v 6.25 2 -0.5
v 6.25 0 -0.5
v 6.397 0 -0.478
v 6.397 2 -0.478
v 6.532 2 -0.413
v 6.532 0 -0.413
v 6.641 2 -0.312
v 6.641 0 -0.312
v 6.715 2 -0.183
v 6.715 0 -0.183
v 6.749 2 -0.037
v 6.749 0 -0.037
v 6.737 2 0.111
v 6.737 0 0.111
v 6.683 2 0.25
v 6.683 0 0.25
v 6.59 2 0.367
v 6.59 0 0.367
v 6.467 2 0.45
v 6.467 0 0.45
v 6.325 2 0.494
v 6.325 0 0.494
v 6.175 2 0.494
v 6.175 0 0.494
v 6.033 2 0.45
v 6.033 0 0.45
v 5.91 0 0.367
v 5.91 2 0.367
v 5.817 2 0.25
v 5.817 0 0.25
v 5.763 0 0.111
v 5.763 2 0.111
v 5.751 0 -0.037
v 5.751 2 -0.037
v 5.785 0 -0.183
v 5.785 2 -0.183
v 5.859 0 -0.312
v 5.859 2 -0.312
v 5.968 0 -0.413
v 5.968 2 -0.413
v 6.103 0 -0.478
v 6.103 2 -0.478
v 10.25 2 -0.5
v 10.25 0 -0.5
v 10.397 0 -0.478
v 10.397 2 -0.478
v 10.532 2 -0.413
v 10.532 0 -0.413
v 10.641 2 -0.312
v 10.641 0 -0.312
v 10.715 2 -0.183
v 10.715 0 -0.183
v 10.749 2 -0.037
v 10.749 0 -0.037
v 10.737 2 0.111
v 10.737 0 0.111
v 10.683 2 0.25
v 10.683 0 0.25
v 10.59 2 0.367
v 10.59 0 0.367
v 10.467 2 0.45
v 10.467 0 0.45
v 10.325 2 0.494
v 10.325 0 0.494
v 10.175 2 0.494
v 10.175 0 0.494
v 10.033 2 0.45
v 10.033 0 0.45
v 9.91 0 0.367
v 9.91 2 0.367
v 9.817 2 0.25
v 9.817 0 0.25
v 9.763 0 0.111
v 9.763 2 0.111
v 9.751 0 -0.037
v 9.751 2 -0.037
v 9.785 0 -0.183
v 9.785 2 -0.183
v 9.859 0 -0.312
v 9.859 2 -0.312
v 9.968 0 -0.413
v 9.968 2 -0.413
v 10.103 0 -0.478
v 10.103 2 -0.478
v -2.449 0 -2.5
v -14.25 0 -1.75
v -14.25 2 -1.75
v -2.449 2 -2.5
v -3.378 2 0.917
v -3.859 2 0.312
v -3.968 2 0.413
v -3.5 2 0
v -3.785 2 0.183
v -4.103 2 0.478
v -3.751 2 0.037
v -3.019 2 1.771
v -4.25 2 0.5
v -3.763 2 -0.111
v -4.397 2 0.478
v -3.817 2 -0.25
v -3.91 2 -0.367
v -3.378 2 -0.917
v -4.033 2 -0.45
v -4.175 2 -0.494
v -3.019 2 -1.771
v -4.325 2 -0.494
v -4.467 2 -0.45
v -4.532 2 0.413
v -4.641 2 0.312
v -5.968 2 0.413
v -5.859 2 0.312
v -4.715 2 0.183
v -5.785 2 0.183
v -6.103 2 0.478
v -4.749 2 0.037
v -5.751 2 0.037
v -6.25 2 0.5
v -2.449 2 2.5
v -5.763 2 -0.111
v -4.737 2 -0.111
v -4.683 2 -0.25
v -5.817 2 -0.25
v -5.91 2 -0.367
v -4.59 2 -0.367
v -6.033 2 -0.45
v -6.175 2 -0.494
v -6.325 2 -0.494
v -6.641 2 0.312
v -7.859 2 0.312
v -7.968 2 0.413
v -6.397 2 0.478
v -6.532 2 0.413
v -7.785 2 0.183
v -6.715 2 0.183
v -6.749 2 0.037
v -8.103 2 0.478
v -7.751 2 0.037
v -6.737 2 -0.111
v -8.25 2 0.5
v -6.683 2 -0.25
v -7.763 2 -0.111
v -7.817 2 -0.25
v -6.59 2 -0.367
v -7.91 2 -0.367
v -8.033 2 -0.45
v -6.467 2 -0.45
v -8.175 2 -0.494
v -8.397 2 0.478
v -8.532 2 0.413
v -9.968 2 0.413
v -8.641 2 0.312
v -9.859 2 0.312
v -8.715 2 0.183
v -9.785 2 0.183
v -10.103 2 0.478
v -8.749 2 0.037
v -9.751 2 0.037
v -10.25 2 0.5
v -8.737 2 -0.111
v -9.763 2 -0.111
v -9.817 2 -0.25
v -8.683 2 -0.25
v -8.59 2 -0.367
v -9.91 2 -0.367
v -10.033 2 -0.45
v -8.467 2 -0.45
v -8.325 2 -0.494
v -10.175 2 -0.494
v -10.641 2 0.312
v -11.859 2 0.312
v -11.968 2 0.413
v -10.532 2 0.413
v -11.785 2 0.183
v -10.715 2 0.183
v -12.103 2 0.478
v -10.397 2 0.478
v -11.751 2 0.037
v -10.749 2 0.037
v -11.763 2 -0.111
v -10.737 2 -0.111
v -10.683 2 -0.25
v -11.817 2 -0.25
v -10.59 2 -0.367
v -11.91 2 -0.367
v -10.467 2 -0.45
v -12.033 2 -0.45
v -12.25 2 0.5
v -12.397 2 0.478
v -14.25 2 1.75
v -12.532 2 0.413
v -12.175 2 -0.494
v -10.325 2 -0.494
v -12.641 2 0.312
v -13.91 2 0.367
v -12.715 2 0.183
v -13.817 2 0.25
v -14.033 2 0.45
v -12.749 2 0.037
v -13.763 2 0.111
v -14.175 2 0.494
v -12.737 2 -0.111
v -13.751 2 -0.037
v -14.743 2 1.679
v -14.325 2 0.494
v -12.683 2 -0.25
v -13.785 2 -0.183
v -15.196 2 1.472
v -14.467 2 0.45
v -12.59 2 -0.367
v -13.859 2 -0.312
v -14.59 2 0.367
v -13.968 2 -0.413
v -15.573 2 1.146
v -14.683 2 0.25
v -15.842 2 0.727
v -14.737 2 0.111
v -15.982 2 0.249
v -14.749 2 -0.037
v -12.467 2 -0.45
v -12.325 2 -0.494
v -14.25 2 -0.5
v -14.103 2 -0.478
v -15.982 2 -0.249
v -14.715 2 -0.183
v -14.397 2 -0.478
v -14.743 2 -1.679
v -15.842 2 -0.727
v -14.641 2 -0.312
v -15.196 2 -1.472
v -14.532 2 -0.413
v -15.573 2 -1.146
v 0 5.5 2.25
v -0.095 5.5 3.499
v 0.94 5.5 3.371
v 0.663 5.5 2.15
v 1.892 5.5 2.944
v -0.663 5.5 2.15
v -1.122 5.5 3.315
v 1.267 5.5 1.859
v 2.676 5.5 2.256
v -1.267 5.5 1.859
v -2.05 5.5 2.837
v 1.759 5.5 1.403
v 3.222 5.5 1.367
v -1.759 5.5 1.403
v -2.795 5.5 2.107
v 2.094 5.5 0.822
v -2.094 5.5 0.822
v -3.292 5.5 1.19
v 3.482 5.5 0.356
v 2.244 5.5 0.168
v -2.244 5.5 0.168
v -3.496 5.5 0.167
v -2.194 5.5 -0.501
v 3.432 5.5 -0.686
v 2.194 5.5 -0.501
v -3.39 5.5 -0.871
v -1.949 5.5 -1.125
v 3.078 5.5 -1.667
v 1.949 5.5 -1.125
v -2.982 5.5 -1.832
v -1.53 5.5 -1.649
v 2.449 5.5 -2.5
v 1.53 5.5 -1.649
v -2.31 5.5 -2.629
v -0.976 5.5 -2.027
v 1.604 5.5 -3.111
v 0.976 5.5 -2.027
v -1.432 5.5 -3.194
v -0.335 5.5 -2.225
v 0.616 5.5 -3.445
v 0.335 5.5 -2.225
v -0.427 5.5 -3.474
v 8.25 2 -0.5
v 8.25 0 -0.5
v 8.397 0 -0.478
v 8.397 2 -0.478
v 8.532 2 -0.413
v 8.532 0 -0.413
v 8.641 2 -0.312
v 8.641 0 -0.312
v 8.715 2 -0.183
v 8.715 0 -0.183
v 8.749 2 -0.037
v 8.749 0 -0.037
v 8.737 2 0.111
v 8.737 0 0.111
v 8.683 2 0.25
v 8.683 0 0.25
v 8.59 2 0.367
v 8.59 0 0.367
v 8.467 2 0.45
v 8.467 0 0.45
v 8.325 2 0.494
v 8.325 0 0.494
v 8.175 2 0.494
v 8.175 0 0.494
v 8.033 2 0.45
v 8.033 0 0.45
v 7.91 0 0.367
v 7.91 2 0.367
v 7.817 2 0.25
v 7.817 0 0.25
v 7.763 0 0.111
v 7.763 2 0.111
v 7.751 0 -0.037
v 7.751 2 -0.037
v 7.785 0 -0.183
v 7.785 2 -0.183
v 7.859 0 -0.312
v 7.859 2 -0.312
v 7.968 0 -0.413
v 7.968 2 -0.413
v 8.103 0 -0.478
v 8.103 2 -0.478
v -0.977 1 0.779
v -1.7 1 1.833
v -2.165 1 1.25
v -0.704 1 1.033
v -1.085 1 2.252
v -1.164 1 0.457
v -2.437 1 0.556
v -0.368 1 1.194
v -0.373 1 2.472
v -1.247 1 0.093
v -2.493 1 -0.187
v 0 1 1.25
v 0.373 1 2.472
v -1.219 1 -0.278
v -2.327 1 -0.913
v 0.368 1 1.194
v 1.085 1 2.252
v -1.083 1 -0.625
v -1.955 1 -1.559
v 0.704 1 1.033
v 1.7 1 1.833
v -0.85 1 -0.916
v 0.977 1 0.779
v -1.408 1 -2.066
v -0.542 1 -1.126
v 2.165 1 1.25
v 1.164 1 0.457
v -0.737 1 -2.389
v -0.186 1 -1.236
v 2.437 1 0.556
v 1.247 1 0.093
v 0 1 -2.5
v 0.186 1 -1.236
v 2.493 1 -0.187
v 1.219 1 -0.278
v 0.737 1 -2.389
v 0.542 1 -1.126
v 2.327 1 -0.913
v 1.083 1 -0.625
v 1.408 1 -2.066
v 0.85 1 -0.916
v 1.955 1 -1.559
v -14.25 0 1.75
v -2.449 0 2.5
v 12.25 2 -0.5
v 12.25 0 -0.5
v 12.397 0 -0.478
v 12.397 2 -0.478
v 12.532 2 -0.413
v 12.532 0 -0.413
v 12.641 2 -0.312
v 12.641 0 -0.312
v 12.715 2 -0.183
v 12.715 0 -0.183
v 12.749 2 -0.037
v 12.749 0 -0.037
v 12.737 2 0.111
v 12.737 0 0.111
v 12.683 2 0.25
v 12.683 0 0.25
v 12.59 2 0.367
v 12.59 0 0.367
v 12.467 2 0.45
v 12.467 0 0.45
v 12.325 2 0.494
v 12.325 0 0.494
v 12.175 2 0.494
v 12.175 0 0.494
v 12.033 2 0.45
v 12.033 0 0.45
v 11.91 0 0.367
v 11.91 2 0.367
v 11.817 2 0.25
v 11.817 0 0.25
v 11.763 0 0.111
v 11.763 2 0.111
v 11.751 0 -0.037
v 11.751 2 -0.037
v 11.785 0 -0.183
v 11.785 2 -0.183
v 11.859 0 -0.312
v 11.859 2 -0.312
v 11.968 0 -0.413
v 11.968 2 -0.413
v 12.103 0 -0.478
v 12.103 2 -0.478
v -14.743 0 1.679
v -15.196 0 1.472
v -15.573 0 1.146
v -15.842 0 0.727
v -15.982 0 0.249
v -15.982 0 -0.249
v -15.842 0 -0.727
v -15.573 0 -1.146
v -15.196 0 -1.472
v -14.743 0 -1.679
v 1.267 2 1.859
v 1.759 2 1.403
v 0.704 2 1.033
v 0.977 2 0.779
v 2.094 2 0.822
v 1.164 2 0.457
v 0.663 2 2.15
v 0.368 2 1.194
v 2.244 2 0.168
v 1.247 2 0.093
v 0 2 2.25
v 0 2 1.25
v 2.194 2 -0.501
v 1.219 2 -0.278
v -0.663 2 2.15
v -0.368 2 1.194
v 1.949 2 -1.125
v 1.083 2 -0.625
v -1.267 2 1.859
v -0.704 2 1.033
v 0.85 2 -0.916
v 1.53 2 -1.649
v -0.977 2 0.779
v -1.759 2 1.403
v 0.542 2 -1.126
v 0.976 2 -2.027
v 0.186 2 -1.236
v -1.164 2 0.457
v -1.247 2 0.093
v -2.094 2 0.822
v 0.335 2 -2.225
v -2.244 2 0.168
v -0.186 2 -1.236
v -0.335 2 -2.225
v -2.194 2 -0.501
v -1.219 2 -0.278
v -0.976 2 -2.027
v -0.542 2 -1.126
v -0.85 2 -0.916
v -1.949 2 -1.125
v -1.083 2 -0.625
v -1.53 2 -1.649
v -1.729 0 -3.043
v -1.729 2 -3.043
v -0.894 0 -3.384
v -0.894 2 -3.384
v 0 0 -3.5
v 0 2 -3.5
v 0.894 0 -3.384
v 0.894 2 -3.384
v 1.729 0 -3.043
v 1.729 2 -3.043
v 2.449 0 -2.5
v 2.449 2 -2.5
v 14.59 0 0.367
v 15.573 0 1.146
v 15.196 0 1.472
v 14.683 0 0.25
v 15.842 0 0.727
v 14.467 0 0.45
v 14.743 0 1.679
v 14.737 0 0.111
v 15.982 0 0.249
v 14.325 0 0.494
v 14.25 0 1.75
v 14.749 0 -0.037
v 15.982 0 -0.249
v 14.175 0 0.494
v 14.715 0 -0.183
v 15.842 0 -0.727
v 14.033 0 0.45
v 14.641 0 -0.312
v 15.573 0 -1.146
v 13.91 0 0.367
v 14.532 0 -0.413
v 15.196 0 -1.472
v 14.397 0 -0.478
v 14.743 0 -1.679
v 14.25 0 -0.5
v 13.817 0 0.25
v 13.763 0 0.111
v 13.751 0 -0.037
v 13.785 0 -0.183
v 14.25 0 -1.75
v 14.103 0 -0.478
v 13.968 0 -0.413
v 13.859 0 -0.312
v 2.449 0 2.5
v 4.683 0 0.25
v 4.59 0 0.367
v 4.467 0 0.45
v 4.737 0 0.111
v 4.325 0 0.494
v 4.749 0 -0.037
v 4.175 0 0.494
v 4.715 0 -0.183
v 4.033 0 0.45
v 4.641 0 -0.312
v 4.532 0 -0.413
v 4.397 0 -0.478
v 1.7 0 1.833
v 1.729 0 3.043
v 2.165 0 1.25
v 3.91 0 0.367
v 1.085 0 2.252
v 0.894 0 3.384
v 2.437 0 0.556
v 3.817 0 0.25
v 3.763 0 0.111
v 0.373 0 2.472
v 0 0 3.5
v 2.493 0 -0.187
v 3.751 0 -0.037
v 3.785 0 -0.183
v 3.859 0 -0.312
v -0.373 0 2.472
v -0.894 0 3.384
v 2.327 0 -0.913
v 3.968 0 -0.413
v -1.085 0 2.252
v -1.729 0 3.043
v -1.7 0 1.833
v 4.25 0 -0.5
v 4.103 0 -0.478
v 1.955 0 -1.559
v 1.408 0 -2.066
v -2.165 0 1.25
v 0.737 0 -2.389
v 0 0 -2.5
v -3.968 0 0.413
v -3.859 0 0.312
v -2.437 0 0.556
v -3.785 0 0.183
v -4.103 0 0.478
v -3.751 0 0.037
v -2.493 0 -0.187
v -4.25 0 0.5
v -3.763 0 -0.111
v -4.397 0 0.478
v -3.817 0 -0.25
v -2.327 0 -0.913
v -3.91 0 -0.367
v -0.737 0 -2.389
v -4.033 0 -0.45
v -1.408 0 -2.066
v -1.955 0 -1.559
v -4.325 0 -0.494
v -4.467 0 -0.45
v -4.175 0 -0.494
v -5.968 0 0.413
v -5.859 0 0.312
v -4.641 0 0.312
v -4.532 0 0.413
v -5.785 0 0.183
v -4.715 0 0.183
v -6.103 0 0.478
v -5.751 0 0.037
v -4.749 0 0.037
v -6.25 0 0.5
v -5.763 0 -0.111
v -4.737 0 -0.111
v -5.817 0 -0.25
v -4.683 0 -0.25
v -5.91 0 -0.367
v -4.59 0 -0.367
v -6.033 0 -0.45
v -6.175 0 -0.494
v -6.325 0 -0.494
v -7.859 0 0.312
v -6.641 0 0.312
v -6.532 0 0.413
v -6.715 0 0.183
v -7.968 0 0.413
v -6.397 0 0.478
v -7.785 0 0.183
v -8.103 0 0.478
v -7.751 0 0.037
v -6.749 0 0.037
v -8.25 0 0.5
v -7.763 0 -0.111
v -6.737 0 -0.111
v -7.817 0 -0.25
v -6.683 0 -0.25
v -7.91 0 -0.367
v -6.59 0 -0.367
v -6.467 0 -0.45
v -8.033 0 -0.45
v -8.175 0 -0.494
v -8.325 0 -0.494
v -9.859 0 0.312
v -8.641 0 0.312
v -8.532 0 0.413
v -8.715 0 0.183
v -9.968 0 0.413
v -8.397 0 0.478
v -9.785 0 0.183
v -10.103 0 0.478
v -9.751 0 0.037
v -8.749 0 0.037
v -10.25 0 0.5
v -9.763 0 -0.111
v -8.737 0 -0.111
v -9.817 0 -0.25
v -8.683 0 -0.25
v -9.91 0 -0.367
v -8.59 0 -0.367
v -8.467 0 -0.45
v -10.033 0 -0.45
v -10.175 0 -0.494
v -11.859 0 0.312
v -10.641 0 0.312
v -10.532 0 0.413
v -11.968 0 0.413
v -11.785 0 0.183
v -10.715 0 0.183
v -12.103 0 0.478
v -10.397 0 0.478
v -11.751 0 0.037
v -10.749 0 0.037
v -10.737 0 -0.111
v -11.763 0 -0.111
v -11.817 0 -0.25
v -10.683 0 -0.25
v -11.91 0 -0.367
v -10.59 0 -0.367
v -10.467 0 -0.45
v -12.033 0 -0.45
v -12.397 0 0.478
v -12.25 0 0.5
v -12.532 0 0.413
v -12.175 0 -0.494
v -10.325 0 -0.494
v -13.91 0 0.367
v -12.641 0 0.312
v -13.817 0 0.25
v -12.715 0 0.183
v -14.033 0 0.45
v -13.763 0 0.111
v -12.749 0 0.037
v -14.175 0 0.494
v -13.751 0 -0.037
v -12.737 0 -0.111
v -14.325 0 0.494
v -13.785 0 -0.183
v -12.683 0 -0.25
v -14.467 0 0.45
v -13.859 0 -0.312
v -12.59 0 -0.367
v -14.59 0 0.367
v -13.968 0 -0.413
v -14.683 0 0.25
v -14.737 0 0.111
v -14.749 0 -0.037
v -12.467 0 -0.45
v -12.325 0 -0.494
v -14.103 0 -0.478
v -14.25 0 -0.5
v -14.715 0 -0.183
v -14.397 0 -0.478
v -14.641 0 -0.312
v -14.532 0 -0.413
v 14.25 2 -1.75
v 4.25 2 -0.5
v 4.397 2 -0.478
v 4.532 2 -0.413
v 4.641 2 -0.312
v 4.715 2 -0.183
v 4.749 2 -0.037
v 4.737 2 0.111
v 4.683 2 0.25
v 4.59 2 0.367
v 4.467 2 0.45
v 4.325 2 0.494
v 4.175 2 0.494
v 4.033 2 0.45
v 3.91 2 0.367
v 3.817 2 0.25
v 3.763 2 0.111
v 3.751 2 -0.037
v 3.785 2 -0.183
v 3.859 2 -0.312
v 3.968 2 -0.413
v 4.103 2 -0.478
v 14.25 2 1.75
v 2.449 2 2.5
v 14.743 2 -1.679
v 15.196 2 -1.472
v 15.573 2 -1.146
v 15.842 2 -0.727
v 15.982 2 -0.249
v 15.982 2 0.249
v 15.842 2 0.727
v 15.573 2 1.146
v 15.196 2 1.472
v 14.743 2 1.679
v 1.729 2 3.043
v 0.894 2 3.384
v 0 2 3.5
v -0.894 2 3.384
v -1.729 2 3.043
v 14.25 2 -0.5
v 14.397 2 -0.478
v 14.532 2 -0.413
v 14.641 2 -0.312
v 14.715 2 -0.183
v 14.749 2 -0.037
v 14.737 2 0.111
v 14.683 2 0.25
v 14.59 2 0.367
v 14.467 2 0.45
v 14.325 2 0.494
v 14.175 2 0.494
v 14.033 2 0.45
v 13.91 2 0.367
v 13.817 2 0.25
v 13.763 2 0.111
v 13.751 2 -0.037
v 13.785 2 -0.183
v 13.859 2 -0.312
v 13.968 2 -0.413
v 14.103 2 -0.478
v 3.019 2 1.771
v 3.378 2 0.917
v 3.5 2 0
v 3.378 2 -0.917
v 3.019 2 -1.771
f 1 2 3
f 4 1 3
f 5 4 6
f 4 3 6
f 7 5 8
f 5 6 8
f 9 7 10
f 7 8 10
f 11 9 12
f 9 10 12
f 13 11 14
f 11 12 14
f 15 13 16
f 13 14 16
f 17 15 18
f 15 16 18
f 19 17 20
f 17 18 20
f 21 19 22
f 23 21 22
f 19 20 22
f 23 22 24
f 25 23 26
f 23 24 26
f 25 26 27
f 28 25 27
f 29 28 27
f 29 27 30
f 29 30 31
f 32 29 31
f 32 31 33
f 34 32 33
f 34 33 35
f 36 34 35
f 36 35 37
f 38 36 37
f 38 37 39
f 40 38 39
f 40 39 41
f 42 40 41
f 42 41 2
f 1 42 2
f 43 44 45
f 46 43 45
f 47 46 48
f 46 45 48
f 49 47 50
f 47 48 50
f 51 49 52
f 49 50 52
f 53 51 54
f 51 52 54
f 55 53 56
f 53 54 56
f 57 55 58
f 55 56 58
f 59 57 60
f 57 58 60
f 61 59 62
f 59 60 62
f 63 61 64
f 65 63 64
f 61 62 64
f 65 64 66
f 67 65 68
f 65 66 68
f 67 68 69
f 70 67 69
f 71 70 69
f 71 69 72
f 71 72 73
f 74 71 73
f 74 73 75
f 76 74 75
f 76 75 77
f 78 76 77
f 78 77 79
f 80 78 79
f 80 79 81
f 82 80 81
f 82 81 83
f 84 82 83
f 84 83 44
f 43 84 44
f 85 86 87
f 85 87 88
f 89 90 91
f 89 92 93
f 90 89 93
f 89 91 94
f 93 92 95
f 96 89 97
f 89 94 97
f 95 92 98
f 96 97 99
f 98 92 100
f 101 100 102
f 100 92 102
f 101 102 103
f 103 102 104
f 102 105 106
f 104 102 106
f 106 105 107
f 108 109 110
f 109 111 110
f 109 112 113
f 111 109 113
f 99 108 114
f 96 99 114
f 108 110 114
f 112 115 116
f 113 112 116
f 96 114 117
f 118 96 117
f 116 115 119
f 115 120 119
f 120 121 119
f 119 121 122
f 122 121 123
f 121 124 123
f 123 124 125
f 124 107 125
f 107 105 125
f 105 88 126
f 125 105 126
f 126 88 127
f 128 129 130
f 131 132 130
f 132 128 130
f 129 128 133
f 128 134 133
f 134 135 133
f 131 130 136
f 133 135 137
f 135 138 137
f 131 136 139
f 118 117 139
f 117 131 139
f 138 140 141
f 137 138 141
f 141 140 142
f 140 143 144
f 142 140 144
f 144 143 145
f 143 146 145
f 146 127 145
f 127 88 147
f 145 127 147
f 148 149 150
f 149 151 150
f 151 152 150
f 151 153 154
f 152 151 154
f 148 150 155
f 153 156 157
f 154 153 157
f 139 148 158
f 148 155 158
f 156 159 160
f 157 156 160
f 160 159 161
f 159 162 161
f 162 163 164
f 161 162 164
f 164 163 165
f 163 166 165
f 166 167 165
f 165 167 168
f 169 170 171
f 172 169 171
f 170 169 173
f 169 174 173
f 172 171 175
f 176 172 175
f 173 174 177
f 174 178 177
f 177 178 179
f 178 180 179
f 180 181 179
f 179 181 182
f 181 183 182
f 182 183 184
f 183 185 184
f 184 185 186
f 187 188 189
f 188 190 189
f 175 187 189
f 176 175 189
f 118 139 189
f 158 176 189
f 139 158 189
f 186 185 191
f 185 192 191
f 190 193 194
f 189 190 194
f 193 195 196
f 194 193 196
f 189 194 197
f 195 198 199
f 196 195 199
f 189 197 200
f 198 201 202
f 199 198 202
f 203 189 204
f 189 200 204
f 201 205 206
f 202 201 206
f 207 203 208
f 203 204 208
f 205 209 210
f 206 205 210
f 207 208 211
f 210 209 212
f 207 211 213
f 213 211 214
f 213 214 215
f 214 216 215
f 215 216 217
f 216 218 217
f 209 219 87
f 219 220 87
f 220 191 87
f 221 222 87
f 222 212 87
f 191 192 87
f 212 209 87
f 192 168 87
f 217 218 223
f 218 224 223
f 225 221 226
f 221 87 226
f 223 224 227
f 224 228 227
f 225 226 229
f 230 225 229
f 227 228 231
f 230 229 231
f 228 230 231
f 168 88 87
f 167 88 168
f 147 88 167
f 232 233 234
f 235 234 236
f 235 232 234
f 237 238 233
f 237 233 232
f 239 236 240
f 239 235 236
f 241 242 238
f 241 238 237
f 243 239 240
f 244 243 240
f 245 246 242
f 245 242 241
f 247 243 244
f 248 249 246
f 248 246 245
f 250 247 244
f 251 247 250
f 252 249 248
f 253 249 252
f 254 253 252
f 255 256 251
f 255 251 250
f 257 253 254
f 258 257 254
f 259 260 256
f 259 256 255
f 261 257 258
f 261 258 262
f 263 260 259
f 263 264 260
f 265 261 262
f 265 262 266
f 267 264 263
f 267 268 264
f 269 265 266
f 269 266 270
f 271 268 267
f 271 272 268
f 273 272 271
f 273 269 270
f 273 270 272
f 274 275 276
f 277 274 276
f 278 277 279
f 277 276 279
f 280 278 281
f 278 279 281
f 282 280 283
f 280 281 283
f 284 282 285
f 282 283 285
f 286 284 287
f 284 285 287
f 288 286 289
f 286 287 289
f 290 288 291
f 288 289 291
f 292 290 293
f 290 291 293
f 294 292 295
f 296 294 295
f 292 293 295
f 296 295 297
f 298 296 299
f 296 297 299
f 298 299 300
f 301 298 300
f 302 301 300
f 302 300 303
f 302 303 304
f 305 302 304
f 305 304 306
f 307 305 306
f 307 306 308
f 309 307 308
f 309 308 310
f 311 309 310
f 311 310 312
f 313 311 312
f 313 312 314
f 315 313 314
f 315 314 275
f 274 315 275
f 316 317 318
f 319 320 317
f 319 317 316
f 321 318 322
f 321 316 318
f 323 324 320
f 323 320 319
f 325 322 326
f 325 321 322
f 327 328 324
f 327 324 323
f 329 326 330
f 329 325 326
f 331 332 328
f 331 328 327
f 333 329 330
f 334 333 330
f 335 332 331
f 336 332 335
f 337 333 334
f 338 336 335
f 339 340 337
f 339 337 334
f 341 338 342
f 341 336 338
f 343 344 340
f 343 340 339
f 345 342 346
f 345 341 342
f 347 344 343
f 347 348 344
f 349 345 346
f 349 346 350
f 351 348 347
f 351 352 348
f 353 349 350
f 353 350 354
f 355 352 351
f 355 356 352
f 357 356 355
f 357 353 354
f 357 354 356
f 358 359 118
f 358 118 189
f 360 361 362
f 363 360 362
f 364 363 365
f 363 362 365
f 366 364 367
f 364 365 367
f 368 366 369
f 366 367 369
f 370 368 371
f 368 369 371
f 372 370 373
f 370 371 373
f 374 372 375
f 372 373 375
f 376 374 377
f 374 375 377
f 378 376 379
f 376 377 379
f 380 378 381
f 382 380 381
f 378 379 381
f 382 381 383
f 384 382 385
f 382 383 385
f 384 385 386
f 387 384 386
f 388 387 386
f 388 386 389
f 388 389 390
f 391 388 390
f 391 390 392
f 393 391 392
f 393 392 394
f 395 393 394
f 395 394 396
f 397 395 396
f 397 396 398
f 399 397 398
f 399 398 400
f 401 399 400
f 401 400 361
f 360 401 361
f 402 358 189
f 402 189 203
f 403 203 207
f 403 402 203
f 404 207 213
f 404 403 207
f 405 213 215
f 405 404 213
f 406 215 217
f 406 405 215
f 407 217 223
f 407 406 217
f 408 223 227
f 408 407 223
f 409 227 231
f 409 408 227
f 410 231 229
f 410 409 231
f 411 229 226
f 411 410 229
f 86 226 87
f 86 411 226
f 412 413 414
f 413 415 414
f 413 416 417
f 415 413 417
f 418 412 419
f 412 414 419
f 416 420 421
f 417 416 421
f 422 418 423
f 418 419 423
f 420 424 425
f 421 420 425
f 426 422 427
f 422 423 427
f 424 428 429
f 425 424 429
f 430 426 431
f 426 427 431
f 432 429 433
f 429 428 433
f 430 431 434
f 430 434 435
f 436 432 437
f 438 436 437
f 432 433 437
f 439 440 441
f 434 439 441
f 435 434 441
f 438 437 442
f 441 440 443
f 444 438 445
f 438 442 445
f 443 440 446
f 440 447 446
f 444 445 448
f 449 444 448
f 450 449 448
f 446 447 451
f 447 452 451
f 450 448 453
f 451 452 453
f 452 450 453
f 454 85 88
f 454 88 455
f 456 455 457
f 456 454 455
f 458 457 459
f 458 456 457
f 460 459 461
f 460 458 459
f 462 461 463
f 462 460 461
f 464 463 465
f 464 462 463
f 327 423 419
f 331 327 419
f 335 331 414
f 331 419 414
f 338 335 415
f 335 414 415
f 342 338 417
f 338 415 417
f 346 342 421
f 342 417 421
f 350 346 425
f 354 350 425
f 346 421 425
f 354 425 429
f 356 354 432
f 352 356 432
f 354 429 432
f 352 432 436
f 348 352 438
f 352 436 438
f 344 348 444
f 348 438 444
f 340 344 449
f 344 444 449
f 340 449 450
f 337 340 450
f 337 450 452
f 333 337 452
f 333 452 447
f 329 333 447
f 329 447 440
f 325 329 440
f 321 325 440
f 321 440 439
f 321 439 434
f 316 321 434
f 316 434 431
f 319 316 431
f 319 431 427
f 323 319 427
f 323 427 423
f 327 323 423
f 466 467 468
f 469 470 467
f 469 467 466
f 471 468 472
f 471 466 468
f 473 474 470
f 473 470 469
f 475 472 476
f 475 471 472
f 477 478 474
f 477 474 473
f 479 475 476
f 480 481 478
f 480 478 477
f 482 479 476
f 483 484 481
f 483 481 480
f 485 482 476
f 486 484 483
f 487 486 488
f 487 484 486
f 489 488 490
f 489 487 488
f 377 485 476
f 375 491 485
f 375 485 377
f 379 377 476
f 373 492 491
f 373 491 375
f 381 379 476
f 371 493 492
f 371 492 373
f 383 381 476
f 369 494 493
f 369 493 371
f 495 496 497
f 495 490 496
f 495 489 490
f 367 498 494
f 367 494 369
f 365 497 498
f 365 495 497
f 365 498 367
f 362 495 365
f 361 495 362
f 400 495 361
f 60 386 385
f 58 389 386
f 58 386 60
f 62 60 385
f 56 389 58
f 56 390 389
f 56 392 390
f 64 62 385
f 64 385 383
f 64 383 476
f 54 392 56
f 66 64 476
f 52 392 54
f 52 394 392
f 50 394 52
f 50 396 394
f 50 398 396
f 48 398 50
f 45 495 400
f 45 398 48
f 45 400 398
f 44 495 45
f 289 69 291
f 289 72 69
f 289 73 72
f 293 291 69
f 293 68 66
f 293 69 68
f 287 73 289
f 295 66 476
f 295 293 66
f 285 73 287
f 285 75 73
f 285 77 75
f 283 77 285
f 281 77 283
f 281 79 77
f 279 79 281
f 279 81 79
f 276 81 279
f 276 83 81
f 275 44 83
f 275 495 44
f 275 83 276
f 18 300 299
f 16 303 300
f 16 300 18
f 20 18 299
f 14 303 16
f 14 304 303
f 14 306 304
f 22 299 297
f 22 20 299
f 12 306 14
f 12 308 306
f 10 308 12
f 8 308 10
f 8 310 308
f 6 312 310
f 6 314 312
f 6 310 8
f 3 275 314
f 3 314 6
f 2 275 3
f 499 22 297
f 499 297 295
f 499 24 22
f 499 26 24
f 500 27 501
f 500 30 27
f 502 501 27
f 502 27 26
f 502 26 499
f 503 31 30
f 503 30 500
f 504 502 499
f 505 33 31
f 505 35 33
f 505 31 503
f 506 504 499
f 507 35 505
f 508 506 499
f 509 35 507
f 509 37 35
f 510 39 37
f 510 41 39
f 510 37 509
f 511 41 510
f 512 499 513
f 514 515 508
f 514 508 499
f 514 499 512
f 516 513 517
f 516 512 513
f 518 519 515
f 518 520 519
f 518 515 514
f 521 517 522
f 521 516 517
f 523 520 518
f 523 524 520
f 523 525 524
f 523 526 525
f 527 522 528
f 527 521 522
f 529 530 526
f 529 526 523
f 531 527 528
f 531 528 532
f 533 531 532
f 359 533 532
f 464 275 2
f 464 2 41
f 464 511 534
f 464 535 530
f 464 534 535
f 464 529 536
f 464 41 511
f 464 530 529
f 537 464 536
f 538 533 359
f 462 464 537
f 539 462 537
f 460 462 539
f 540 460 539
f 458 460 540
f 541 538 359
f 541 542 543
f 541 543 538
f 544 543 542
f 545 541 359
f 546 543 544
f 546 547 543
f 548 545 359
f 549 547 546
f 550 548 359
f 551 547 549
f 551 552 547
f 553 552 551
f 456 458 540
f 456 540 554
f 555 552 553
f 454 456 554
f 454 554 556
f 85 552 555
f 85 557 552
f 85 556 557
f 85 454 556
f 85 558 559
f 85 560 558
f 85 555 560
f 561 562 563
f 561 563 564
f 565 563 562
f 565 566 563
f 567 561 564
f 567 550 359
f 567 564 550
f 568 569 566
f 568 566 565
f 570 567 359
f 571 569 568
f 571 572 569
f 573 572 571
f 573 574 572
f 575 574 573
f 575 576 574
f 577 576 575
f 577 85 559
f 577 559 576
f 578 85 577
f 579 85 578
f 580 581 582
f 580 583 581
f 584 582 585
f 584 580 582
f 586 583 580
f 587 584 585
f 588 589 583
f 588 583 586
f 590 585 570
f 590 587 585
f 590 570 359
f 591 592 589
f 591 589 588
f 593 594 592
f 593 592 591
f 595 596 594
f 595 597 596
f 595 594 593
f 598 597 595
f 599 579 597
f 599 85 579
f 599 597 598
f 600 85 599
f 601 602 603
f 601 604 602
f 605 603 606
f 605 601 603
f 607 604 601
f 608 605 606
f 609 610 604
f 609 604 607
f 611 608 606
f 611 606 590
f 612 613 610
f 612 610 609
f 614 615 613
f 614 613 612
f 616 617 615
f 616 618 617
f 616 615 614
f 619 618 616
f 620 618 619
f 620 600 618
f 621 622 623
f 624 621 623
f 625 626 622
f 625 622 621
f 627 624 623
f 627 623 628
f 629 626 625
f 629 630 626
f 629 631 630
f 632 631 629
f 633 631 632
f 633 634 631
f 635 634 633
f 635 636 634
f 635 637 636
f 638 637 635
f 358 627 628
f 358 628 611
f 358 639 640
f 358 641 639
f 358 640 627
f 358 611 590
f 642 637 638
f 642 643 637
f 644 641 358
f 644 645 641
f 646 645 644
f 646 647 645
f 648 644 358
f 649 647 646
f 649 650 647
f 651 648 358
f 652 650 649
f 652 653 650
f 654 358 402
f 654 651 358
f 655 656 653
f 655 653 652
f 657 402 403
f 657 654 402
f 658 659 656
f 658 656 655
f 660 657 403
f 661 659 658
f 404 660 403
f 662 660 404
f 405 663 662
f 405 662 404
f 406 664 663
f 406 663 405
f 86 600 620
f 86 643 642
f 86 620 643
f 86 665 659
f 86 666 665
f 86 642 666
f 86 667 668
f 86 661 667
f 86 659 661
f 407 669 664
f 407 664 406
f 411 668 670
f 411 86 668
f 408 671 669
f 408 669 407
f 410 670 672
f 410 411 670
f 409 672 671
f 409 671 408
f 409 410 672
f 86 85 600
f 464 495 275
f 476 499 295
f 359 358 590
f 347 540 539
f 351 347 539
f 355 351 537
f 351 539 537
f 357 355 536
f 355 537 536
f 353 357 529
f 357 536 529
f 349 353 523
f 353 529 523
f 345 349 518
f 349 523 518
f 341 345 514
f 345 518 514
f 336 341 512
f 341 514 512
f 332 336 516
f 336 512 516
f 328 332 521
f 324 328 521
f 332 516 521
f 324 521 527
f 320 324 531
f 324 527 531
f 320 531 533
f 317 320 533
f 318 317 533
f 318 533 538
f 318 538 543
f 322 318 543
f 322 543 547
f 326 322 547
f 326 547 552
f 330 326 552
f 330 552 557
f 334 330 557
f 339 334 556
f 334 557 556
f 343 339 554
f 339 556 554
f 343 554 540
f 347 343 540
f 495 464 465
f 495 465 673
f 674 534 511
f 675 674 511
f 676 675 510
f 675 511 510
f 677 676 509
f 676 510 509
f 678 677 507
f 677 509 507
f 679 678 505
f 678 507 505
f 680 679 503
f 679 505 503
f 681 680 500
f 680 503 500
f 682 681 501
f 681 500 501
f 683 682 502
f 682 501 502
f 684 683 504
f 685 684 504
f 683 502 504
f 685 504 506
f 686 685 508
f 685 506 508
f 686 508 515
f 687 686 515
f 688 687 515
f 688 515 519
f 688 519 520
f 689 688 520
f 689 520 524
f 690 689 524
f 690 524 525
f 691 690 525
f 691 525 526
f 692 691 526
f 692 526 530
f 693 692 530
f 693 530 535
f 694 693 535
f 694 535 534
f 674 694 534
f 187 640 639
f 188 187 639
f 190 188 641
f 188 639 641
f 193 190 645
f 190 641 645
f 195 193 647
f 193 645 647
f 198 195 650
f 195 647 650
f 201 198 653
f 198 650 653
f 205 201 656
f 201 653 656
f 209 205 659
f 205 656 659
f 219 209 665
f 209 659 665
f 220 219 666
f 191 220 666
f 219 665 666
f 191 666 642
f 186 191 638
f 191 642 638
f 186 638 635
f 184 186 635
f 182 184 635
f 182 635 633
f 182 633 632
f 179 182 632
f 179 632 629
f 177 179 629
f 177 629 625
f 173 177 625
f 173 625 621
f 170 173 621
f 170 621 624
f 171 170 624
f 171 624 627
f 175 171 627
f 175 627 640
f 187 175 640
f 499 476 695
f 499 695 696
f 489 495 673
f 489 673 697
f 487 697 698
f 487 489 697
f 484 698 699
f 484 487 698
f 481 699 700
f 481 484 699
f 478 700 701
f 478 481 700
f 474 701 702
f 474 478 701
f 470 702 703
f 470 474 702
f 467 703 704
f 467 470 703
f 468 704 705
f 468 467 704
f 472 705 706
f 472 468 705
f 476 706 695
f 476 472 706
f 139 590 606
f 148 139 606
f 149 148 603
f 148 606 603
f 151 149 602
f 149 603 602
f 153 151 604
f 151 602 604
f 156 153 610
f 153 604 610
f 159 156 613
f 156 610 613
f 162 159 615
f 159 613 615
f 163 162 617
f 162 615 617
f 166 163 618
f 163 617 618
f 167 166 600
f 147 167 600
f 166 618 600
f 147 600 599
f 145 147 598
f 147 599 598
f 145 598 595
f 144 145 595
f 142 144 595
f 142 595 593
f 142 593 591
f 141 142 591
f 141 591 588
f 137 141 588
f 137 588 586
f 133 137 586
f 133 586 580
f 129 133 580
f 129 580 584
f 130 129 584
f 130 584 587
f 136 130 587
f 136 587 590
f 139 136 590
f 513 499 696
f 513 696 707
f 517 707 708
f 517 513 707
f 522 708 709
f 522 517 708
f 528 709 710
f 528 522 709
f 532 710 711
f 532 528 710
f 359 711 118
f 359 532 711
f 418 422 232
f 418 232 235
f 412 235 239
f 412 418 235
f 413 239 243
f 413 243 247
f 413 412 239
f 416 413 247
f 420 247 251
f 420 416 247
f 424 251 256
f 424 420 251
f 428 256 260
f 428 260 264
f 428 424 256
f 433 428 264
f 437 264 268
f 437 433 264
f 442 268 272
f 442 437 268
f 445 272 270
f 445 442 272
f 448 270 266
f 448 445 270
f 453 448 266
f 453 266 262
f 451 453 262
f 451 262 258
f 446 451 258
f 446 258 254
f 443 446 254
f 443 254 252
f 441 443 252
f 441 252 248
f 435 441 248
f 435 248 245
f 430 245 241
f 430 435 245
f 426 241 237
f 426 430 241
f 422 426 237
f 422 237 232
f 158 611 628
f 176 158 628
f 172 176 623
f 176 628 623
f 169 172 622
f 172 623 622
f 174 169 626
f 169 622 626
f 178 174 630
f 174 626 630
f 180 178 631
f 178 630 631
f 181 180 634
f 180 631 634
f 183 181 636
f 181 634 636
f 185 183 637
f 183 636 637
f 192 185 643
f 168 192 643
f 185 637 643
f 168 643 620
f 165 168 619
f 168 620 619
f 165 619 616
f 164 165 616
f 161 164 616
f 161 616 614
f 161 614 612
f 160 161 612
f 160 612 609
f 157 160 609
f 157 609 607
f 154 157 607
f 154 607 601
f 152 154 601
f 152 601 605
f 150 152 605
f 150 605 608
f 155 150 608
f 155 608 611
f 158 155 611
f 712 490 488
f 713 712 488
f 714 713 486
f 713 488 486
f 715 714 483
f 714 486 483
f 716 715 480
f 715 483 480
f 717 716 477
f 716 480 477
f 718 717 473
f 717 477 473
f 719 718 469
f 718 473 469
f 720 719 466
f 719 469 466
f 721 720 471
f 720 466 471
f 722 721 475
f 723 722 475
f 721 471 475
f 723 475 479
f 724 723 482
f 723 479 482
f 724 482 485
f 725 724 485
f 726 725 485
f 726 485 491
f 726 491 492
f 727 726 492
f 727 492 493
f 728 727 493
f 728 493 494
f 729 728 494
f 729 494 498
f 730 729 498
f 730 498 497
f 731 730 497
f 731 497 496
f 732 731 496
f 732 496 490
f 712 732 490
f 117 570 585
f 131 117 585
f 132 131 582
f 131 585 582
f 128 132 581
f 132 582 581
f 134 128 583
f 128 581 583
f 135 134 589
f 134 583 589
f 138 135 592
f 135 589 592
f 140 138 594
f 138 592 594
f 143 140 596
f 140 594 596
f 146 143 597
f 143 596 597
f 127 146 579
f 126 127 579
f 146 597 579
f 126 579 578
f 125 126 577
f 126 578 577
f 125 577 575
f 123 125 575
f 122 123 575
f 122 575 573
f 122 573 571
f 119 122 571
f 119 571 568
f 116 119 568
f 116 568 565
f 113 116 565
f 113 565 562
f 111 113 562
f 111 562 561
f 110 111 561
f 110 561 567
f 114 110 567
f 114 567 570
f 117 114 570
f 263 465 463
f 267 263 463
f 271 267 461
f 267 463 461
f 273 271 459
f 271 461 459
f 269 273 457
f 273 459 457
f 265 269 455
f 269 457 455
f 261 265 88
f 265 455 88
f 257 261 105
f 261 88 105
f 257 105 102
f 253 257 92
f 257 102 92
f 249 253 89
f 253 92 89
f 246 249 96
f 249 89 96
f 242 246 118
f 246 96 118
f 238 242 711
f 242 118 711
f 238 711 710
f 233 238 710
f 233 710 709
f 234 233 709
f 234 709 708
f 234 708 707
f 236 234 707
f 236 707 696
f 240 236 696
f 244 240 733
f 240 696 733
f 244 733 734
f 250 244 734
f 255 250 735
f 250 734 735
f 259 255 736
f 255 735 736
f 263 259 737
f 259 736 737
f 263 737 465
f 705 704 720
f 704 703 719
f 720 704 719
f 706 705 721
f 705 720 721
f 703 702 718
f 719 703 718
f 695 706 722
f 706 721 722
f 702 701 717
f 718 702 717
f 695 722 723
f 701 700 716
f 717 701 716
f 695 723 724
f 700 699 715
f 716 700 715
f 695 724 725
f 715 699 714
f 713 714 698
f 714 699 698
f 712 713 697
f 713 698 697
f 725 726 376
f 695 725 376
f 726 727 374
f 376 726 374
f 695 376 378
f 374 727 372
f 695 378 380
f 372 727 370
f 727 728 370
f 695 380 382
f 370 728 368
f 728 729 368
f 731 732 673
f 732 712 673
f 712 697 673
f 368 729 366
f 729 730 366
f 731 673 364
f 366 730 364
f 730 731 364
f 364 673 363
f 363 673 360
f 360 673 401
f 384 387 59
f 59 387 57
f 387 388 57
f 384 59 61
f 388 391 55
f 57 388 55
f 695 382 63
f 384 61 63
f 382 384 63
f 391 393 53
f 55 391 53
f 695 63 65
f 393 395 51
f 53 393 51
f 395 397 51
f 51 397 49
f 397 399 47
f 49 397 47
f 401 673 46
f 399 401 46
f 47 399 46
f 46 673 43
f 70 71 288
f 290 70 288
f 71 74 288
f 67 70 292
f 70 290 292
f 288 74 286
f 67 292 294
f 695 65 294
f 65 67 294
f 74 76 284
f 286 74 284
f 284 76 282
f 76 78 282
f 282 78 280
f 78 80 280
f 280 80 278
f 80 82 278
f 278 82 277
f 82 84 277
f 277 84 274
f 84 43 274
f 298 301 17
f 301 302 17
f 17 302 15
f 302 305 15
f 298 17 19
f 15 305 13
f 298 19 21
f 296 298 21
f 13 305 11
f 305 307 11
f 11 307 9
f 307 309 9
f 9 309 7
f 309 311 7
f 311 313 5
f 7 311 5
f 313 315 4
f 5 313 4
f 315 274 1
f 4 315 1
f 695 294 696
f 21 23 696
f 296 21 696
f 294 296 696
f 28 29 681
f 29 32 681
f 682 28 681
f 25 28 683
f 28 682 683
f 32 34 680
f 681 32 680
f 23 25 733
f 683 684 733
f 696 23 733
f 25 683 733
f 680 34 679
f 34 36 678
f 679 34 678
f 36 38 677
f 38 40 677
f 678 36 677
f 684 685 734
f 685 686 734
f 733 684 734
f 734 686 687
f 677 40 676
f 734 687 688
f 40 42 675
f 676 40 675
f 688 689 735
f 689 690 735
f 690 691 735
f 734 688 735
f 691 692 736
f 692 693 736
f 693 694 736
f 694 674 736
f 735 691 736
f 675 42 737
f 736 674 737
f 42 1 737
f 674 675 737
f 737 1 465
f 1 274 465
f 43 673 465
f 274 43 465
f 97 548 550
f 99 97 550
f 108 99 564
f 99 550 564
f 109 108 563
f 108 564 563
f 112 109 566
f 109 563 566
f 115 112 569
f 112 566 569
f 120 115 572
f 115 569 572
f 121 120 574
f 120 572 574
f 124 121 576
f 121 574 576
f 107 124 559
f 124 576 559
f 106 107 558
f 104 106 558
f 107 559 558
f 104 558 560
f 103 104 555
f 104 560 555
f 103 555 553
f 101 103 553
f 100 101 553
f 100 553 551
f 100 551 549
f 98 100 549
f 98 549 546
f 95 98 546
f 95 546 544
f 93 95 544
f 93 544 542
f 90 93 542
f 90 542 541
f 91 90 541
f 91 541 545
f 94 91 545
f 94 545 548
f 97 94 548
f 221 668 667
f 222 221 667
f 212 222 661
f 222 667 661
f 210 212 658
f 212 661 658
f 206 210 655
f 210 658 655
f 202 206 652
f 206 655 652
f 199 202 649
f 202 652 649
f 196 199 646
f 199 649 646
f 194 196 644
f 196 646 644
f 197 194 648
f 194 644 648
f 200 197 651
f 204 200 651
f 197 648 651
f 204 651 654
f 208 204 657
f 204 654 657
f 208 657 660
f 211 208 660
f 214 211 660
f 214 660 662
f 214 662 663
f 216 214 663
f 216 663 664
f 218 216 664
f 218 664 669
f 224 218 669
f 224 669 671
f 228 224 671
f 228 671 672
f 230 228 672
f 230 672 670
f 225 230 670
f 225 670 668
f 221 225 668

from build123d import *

# Parameters (mm, degrees)
BOSS_EXTRUDE1_DEPTH = 2
SKETCH2_R           = 3.5
SKETCH2_R_2         = 2.25
BOSS_EXTRUDE2_DEPTH = 3.5
SKETCH3_R           = 1.25
CUT_EXTRUDE1_DEPTH  = 5
SKETCH4_R           = 2.5
CUT_EXTRUDE2_DEPTH  = 1
SKETCH5_R           = 0.5
CUT_EXTRUDE3_DEPTH  = 5


with BuildPart() as part:
    # Sketch1 → Boss-Extrude1 (new body)
    with BuildSketch(Plane(origin=(0, 0, 0), x_dir=(1, 0, 0), z_dir=(0, 1, 0))):
        with BuildLine():
            Line((-14.25, 1.75), (-2.449489743, 2.5))
            ThreePointArc((-2.449489743, 2.5), (0, 3.5), (2.449489743, 2.5))
            Line((2.449489743, 2.5), (14.25, 1.75))
            ThreePointArc((14.25, 1.75), (16, 0), (14.25, -1.75))
            Line((14.25, -1.75), (2.449489743, -2.5))
            ThreePointArc((2.449489743, -2.5), (0, -3.5), (-2.449489743, -2.5))
            Line((-2.449489743, -2.5), (-14.25, -1.75))
            ThreePointArc((-14.25, -1.75), (-16, 0), (-14.25, 1.75))
        make_face()
    extrude(amount=BOSS_EXTRUDE1_DEPTH)

    # Sketch2 → Boss-Extrude2 (add)
    with BuildSketch(Plane(origin=(0, 2, 0), x_dir=(1, 0, 0), z_dir=(0, 1, 0))):
        Circle(SKETCH2_R)
        Circle(SKETCH2_R_2, mode=Mode.SUBTRACT)
    extrude(amount=BOSS_EXTRUDE2_DEPTH)

    # Sketch3 → Cut-Extrude1 (cut)
    with BuildSketch(Plane(origin=(0, 2, 0), x_dir=(1, 0, 0), z_dir=(0, 1, 0))):
        Circle(SKETCH3_R)
    extrude(amount=-CUT_EXTRUDE1_DEPTH, mode=Mode.SUBTRACT)

    # Sketch4 → Cut-Extrude2 (cut)
    with BuildSketch(Plane.XZ):
        Circle(SKETCH4_R)
    extrude(amount=-CUT_EXTRUDE2_DEPTH, mode=Mode.SUBTRACT)

    # Sketch5 → Cut-Extrude3 (cut)
    with BuildSketch(Plane.XZ):
        with Locations((14.25, 0)):
            Circle(SKETCH5_R)
        with Locations((12.25, 0)):
            Circle(SKETCH5_R)
        with Locations((10.25, 0)):
            Circle(SKETCH5_R)
        with Locations((8.25, 0)):
            Circle(SKETCH5_R)
        with Locations((6.25, 0)):
            Circle(SKETCH5_R)
        with Locations((4.25, 0)):
            Circle(SKETCH5_R)
        with Locations((-14.25, 0)):
            Circle(SKETCH5_R)
        with Locations((-12.25, 0)):
            Circle(SKETCH5_R)
        with Locations((-10.25, 0)):
            Circle(SKETCH5_R)
        with Locations((-8.25, 0)):
            Circle(SKETCH5_R)
        with Locations((-6.25, 0)):
            Circle(SKETCH5_R)
        with Locations((-4.25, 0)):
            Circle(SKETCH5_R)
    extrude(amount=-CUT_EXTRUDE3_DEPTH, mode=Mode.SUBTRACT)


solid = part.part
